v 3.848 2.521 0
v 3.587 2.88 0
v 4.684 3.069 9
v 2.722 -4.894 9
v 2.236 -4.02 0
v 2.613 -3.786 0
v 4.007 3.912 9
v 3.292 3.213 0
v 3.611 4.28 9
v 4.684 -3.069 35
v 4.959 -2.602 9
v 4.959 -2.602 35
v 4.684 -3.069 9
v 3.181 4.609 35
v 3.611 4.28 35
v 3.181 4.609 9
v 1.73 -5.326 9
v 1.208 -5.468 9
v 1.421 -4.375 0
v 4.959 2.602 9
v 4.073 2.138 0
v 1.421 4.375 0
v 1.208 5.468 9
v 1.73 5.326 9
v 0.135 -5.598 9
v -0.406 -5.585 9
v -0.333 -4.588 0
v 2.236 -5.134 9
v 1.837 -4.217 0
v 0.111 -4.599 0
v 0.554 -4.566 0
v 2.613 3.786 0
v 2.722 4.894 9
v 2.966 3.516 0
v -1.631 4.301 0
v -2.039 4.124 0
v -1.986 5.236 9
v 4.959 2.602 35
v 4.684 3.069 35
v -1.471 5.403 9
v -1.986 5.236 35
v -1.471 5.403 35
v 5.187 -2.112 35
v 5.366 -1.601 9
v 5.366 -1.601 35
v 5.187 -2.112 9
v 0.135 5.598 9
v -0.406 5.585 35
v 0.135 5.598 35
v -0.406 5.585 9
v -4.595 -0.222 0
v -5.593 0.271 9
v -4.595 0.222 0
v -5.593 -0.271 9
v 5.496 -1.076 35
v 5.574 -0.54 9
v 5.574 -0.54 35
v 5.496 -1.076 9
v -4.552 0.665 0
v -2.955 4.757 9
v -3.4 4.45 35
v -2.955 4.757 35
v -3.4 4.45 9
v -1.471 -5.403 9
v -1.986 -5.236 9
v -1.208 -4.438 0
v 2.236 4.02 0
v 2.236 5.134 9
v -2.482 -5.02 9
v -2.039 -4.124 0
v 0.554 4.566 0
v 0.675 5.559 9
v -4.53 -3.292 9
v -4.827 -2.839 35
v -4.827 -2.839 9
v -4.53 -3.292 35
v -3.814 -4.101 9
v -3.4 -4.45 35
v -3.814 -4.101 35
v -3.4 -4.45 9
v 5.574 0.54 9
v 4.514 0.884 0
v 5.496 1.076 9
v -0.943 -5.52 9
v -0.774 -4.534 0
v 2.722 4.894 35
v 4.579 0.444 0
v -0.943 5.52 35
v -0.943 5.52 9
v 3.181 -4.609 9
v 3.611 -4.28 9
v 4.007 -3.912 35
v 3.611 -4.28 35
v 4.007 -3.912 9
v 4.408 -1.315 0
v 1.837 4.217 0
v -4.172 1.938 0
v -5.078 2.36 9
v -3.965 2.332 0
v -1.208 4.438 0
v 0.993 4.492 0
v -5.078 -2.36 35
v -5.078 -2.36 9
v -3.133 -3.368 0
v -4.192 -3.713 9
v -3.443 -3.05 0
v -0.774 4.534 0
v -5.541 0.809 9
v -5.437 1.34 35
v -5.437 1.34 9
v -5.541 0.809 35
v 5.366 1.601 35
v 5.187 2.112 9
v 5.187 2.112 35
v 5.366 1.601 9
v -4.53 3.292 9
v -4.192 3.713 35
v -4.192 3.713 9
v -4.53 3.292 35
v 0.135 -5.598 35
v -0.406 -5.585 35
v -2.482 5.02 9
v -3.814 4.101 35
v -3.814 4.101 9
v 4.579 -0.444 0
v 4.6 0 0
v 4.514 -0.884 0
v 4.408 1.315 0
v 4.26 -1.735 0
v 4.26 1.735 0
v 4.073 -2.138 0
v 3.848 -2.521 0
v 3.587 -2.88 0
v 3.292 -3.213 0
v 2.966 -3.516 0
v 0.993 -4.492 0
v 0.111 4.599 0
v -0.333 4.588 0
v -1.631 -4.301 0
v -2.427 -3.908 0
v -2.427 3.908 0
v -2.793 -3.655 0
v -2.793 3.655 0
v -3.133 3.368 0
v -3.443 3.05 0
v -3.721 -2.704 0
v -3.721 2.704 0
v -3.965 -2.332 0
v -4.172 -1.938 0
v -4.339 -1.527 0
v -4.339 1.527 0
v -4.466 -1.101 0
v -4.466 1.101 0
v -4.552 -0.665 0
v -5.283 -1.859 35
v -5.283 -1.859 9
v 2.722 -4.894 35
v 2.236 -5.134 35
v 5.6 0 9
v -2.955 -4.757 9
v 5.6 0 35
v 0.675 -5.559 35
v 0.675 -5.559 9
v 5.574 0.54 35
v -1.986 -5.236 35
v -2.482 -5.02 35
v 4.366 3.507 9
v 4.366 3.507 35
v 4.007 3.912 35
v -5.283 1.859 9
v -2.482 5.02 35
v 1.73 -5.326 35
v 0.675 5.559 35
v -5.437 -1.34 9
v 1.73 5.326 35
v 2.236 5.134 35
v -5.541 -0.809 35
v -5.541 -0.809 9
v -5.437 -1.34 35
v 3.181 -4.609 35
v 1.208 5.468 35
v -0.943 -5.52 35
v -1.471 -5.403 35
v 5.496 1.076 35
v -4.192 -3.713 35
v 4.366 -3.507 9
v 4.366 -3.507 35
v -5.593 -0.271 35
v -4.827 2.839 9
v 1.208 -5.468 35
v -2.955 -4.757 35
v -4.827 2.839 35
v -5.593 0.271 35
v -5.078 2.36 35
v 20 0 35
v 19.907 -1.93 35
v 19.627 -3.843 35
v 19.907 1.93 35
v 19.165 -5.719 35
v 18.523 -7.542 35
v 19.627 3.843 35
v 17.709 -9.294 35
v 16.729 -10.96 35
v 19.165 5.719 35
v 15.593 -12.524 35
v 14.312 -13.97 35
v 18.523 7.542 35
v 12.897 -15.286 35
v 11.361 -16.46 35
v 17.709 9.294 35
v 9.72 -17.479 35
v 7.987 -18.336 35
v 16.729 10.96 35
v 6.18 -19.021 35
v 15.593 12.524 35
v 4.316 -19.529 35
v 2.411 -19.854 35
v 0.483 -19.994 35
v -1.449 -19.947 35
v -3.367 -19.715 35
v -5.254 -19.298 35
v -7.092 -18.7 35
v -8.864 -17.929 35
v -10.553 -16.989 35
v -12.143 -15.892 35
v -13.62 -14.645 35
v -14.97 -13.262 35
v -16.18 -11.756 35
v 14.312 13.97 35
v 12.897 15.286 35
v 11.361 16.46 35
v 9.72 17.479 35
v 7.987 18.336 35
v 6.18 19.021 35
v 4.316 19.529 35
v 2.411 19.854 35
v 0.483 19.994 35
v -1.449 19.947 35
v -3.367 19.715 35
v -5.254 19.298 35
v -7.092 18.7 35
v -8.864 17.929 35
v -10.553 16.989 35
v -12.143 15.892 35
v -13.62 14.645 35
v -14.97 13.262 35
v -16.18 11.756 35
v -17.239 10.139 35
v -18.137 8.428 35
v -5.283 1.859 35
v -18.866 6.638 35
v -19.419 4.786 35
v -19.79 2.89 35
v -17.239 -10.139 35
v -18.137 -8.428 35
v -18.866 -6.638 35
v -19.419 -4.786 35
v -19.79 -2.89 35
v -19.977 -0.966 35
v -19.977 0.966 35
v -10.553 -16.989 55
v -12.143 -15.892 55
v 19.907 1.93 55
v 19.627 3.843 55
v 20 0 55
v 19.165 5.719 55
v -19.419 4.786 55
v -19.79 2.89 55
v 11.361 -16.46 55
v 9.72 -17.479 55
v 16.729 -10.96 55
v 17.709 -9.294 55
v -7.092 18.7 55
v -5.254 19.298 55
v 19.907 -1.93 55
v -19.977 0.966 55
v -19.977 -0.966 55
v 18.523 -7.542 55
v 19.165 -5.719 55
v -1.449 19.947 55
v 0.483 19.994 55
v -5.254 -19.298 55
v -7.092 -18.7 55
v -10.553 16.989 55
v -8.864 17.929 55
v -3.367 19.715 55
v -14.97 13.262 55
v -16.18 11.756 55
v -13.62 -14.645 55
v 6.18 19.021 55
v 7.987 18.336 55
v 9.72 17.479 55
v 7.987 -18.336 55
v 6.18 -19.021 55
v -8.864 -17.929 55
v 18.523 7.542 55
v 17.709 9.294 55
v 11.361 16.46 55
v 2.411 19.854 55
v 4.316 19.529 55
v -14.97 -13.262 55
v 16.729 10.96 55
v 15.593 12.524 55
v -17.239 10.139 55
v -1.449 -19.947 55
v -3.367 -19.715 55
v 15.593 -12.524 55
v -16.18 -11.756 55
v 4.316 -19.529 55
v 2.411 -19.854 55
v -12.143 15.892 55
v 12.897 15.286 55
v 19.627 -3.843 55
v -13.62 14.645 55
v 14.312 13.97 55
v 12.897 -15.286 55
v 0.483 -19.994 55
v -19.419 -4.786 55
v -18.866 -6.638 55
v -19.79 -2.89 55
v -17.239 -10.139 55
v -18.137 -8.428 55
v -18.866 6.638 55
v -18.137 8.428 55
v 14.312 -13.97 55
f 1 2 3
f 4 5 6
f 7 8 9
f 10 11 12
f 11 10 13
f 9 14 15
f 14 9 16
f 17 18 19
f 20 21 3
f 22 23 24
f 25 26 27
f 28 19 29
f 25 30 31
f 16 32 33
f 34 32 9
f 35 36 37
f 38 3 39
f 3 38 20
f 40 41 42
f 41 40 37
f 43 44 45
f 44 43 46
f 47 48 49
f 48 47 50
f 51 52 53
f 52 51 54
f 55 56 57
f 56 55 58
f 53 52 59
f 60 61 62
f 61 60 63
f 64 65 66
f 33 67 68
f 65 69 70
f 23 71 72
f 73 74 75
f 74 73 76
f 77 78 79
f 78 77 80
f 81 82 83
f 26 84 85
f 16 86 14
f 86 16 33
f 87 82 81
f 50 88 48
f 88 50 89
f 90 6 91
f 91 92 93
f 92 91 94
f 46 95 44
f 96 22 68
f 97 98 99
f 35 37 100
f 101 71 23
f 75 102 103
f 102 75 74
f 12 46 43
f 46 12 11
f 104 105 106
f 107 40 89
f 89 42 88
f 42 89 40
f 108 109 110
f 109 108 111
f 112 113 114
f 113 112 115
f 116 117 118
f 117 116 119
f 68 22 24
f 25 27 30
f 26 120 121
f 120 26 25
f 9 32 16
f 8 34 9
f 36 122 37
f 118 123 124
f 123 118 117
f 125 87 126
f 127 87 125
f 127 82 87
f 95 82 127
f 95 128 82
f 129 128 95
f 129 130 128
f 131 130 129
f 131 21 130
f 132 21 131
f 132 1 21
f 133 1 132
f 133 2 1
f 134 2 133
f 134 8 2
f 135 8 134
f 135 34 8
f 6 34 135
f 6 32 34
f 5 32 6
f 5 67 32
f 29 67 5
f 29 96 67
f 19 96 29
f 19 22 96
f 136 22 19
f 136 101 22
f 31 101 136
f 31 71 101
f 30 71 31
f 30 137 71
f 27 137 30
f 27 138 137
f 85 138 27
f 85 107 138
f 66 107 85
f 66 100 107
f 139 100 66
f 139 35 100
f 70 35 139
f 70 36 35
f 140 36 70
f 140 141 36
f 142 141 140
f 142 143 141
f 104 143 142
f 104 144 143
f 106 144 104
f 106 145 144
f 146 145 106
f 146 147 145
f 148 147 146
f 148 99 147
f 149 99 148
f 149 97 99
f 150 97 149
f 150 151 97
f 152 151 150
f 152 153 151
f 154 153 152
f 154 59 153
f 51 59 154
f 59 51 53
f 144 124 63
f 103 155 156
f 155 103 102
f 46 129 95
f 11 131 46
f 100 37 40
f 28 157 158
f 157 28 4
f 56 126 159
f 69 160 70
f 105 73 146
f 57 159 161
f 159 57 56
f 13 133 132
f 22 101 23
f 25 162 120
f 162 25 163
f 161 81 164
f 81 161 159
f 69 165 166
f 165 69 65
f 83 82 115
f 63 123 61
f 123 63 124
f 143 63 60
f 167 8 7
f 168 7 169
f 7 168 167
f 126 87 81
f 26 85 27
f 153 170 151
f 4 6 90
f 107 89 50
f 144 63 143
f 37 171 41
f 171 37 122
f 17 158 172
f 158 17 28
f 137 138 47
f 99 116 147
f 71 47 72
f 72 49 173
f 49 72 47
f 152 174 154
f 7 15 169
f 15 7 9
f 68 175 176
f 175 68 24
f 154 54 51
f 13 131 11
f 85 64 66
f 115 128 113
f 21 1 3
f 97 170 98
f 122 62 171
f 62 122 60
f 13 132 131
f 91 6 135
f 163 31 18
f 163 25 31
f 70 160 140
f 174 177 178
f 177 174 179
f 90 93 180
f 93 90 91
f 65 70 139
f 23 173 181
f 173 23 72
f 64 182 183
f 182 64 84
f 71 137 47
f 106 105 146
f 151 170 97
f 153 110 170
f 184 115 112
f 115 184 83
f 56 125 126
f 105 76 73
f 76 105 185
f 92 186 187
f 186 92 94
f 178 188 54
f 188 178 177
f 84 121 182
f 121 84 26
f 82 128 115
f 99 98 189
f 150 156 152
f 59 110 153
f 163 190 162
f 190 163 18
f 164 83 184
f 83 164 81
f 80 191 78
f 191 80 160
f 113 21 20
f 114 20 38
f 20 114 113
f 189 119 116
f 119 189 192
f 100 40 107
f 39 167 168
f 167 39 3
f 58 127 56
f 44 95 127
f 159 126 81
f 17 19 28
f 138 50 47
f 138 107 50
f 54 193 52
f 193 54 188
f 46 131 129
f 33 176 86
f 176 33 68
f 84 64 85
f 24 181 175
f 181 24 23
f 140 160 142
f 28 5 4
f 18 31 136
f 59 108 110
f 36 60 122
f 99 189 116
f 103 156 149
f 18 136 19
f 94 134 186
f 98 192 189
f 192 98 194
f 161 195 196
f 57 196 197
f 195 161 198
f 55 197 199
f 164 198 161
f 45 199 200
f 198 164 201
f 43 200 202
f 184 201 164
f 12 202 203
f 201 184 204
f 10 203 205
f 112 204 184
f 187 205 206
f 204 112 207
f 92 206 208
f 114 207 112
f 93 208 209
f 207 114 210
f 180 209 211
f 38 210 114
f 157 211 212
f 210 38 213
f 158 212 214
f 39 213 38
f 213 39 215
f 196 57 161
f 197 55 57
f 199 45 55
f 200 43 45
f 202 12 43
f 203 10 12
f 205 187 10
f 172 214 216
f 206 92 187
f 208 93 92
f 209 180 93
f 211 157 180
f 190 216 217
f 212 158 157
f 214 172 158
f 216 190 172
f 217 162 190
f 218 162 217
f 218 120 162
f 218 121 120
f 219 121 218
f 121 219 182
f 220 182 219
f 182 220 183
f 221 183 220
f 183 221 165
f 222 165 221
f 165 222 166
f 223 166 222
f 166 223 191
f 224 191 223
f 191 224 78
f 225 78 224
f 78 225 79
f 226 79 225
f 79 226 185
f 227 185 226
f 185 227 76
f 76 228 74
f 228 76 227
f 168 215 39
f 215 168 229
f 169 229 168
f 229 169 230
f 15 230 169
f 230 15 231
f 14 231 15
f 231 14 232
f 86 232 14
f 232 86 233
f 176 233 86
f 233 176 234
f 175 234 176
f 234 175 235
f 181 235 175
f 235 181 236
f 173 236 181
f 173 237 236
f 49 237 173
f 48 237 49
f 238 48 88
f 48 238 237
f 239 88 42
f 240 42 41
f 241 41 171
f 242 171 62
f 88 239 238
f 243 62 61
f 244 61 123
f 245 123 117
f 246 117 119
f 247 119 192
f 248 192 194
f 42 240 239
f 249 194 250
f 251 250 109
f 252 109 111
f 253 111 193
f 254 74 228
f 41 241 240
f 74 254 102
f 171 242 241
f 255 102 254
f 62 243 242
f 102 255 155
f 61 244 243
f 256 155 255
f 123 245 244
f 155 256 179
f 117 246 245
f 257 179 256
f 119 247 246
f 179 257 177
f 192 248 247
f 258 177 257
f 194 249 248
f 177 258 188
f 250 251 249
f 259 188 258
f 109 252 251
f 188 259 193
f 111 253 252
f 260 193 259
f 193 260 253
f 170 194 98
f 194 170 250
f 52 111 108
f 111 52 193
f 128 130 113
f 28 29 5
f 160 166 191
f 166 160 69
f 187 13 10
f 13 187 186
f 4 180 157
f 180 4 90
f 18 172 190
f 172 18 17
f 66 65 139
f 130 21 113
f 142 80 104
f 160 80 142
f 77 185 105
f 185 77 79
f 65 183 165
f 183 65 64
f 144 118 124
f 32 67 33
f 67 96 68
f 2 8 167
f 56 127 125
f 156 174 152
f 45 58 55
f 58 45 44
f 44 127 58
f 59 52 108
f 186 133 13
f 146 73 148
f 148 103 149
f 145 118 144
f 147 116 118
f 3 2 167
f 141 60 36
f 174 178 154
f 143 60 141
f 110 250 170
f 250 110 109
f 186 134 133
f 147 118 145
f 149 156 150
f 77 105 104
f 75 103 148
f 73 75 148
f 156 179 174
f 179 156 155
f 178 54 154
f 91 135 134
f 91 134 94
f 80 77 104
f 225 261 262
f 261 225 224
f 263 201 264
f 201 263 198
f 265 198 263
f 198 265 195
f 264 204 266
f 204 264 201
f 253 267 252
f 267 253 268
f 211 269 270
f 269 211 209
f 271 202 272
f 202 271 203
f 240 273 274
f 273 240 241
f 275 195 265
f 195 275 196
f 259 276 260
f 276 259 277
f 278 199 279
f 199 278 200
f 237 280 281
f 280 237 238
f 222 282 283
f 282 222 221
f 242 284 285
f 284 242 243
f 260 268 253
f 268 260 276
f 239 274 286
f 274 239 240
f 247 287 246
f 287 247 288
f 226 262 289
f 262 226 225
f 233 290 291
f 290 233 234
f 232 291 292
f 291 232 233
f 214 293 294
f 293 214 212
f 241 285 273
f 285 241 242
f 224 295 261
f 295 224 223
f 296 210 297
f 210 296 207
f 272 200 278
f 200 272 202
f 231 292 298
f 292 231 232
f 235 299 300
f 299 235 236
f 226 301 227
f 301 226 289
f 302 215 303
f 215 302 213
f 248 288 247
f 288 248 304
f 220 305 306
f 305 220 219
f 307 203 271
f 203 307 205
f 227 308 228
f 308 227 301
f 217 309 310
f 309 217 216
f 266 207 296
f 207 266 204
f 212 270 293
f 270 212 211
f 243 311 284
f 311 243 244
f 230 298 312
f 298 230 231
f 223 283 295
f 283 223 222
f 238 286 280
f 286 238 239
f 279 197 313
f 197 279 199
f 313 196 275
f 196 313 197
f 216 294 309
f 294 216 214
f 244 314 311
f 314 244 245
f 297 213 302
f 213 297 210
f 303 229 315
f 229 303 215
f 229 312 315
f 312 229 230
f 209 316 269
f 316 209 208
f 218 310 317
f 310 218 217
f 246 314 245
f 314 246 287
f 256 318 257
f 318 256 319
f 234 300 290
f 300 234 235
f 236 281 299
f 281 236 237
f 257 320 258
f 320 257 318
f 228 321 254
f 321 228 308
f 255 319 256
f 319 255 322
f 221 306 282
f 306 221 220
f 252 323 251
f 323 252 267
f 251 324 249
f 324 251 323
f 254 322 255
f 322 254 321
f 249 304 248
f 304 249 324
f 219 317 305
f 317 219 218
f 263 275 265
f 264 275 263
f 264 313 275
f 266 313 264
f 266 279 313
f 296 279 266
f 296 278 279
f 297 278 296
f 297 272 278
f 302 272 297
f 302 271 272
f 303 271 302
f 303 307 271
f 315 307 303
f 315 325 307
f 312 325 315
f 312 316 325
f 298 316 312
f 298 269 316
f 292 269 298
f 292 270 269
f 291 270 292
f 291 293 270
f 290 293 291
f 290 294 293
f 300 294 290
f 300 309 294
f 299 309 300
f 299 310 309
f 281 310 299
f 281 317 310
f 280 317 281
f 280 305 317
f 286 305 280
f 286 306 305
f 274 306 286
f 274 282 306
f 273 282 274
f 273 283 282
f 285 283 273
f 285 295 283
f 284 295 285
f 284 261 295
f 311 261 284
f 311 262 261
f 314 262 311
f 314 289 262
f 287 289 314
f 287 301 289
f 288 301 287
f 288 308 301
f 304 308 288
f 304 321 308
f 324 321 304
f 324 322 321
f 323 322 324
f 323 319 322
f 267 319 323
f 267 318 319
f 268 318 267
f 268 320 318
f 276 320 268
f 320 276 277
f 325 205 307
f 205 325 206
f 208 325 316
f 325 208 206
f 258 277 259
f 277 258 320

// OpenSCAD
$fn=65;
hull()
{
translate([0,0,15])  cylinder(20,d1=11.2, d2=11.2);
cylinder(9, d1=9.2,d2=11.2);
}
translate([0,0,35]) cylinder(20,d1=40,d2=40);
